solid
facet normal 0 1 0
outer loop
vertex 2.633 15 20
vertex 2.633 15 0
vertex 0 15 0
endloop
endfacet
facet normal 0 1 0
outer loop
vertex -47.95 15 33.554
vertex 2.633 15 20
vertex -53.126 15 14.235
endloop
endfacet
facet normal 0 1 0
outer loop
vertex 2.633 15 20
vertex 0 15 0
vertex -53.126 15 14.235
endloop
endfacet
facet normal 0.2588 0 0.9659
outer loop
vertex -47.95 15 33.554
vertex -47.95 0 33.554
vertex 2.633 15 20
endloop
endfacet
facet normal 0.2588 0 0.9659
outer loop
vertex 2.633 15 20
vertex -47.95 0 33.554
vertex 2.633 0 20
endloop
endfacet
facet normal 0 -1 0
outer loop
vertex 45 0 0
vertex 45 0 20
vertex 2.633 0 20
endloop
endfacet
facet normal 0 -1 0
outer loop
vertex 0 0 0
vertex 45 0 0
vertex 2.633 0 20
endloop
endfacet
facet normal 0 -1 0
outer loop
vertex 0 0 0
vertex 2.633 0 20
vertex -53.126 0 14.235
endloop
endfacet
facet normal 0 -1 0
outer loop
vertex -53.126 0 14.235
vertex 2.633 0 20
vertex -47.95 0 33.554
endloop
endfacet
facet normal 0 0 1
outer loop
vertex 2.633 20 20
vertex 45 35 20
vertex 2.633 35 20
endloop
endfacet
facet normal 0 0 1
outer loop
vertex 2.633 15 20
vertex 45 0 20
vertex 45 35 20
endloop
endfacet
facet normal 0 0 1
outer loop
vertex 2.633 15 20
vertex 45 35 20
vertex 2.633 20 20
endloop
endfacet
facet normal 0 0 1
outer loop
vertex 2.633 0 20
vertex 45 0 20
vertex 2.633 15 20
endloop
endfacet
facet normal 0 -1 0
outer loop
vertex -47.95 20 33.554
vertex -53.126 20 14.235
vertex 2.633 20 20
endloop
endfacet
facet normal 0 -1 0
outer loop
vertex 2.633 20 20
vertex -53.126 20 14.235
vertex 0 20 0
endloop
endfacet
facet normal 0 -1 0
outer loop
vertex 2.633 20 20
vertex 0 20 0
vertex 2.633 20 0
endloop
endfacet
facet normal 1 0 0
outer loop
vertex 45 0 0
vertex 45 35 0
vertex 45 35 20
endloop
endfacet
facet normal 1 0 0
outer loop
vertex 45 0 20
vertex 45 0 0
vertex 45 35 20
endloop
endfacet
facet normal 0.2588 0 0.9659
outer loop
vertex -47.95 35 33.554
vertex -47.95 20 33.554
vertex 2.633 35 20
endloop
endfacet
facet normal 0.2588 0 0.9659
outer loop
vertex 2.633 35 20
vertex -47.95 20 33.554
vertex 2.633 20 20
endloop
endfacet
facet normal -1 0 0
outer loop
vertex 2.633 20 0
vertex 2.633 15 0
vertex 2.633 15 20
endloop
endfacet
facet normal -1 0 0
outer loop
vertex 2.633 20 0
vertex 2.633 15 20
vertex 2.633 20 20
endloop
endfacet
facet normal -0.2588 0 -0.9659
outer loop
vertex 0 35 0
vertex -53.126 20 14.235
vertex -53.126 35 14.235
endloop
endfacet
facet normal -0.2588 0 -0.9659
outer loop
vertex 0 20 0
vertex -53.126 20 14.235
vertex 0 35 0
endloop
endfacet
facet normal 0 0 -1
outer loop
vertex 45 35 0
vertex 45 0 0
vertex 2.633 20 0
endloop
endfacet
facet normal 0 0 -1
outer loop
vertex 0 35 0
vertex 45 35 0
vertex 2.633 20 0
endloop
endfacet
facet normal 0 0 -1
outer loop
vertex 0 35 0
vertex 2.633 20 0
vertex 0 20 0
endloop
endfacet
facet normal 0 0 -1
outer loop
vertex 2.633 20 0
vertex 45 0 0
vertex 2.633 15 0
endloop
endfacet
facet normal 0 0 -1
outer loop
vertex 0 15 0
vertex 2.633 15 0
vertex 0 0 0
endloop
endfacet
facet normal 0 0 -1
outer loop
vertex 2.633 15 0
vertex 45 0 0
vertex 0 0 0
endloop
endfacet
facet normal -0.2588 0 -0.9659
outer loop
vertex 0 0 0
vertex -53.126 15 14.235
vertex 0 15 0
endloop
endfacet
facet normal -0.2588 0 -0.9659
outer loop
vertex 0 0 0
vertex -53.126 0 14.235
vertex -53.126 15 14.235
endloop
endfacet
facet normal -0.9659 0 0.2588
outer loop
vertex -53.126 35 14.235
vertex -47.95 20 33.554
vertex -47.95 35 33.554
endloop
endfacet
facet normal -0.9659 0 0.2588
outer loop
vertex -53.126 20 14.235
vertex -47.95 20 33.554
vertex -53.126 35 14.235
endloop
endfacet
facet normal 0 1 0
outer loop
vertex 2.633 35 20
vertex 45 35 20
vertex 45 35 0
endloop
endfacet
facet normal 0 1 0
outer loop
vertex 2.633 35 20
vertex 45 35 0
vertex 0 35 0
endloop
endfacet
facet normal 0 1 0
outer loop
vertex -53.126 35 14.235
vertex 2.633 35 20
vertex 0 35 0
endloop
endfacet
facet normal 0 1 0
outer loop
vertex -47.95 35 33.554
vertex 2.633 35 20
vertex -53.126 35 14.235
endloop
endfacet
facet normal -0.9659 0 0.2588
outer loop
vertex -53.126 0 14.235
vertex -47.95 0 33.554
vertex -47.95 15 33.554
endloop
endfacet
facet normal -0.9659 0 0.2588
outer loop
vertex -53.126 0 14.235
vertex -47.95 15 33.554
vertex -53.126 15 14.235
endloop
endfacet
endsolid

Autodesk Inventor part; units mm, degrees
ref_plane "YZ Plane" through (0, 0, 0) normal (1, 0, 0) x (0, 1, 0)
ref_plane "XZ Plane" through (0, 0, 0) normal (0, 1, 0) x (-1, 0, 0)
ref_plane "XY Plane" through (0, 0, 0) normal (0, 0, 1) x (1, 0, 0)
sketch "Esquisse1" plane through (0, 0, 0) normal (0, 1, 0) x (-1, 0, 0)
  line L0 (53.1259, 14.235) -> (0, 0)
  line L1 (47.9495, 33.5536) -> (53.1259, 14.235)
  line L2 (-45, 0) -> (-45, 20)
  line L3 (-45, 0) -> (0, 0)
  line L4 (-45, 20) -> (-2.633, 20)
  line L5 (47.9495, 33.5536) -> (-2.633, 20)
  dimension "d1" = 20
  dimension "d4" = 20
  dimension "d7" = 45
  dimension "d9" = 55
  dimension "d11" = 15
extrude "Extrusion1" add sketch "Esquisse1" along normal blind 35
sketch "Esquisse3" plane through (2.633, 0, 20) normal (0, 0, 1) x (1, 0, 0)
  line L0 (0, 0) -> (0, 35) projected
  line L1 (-65, 20) -> (0, 20)
  line L2 (0, 20) -> (0, 15)
  line L3 (0, 15) -> (-65, 15)
  line L4 (-65, 15) -> (-65, 20)
  line L5 (-2.633, 35) -> (-55.759, 35) projected
  point P0 (-2.633, 0)
  point P1 (0, 20)
  dimension "d14" = 5
  dimension "d15" = 65
  dimension "d16" = 15
extrude "Extrusion2" cut sketch "Esquisse3" along normal through all both and the other way through all
equation "\"d1\" = d4"
properties part number "Equerre_gauche"
